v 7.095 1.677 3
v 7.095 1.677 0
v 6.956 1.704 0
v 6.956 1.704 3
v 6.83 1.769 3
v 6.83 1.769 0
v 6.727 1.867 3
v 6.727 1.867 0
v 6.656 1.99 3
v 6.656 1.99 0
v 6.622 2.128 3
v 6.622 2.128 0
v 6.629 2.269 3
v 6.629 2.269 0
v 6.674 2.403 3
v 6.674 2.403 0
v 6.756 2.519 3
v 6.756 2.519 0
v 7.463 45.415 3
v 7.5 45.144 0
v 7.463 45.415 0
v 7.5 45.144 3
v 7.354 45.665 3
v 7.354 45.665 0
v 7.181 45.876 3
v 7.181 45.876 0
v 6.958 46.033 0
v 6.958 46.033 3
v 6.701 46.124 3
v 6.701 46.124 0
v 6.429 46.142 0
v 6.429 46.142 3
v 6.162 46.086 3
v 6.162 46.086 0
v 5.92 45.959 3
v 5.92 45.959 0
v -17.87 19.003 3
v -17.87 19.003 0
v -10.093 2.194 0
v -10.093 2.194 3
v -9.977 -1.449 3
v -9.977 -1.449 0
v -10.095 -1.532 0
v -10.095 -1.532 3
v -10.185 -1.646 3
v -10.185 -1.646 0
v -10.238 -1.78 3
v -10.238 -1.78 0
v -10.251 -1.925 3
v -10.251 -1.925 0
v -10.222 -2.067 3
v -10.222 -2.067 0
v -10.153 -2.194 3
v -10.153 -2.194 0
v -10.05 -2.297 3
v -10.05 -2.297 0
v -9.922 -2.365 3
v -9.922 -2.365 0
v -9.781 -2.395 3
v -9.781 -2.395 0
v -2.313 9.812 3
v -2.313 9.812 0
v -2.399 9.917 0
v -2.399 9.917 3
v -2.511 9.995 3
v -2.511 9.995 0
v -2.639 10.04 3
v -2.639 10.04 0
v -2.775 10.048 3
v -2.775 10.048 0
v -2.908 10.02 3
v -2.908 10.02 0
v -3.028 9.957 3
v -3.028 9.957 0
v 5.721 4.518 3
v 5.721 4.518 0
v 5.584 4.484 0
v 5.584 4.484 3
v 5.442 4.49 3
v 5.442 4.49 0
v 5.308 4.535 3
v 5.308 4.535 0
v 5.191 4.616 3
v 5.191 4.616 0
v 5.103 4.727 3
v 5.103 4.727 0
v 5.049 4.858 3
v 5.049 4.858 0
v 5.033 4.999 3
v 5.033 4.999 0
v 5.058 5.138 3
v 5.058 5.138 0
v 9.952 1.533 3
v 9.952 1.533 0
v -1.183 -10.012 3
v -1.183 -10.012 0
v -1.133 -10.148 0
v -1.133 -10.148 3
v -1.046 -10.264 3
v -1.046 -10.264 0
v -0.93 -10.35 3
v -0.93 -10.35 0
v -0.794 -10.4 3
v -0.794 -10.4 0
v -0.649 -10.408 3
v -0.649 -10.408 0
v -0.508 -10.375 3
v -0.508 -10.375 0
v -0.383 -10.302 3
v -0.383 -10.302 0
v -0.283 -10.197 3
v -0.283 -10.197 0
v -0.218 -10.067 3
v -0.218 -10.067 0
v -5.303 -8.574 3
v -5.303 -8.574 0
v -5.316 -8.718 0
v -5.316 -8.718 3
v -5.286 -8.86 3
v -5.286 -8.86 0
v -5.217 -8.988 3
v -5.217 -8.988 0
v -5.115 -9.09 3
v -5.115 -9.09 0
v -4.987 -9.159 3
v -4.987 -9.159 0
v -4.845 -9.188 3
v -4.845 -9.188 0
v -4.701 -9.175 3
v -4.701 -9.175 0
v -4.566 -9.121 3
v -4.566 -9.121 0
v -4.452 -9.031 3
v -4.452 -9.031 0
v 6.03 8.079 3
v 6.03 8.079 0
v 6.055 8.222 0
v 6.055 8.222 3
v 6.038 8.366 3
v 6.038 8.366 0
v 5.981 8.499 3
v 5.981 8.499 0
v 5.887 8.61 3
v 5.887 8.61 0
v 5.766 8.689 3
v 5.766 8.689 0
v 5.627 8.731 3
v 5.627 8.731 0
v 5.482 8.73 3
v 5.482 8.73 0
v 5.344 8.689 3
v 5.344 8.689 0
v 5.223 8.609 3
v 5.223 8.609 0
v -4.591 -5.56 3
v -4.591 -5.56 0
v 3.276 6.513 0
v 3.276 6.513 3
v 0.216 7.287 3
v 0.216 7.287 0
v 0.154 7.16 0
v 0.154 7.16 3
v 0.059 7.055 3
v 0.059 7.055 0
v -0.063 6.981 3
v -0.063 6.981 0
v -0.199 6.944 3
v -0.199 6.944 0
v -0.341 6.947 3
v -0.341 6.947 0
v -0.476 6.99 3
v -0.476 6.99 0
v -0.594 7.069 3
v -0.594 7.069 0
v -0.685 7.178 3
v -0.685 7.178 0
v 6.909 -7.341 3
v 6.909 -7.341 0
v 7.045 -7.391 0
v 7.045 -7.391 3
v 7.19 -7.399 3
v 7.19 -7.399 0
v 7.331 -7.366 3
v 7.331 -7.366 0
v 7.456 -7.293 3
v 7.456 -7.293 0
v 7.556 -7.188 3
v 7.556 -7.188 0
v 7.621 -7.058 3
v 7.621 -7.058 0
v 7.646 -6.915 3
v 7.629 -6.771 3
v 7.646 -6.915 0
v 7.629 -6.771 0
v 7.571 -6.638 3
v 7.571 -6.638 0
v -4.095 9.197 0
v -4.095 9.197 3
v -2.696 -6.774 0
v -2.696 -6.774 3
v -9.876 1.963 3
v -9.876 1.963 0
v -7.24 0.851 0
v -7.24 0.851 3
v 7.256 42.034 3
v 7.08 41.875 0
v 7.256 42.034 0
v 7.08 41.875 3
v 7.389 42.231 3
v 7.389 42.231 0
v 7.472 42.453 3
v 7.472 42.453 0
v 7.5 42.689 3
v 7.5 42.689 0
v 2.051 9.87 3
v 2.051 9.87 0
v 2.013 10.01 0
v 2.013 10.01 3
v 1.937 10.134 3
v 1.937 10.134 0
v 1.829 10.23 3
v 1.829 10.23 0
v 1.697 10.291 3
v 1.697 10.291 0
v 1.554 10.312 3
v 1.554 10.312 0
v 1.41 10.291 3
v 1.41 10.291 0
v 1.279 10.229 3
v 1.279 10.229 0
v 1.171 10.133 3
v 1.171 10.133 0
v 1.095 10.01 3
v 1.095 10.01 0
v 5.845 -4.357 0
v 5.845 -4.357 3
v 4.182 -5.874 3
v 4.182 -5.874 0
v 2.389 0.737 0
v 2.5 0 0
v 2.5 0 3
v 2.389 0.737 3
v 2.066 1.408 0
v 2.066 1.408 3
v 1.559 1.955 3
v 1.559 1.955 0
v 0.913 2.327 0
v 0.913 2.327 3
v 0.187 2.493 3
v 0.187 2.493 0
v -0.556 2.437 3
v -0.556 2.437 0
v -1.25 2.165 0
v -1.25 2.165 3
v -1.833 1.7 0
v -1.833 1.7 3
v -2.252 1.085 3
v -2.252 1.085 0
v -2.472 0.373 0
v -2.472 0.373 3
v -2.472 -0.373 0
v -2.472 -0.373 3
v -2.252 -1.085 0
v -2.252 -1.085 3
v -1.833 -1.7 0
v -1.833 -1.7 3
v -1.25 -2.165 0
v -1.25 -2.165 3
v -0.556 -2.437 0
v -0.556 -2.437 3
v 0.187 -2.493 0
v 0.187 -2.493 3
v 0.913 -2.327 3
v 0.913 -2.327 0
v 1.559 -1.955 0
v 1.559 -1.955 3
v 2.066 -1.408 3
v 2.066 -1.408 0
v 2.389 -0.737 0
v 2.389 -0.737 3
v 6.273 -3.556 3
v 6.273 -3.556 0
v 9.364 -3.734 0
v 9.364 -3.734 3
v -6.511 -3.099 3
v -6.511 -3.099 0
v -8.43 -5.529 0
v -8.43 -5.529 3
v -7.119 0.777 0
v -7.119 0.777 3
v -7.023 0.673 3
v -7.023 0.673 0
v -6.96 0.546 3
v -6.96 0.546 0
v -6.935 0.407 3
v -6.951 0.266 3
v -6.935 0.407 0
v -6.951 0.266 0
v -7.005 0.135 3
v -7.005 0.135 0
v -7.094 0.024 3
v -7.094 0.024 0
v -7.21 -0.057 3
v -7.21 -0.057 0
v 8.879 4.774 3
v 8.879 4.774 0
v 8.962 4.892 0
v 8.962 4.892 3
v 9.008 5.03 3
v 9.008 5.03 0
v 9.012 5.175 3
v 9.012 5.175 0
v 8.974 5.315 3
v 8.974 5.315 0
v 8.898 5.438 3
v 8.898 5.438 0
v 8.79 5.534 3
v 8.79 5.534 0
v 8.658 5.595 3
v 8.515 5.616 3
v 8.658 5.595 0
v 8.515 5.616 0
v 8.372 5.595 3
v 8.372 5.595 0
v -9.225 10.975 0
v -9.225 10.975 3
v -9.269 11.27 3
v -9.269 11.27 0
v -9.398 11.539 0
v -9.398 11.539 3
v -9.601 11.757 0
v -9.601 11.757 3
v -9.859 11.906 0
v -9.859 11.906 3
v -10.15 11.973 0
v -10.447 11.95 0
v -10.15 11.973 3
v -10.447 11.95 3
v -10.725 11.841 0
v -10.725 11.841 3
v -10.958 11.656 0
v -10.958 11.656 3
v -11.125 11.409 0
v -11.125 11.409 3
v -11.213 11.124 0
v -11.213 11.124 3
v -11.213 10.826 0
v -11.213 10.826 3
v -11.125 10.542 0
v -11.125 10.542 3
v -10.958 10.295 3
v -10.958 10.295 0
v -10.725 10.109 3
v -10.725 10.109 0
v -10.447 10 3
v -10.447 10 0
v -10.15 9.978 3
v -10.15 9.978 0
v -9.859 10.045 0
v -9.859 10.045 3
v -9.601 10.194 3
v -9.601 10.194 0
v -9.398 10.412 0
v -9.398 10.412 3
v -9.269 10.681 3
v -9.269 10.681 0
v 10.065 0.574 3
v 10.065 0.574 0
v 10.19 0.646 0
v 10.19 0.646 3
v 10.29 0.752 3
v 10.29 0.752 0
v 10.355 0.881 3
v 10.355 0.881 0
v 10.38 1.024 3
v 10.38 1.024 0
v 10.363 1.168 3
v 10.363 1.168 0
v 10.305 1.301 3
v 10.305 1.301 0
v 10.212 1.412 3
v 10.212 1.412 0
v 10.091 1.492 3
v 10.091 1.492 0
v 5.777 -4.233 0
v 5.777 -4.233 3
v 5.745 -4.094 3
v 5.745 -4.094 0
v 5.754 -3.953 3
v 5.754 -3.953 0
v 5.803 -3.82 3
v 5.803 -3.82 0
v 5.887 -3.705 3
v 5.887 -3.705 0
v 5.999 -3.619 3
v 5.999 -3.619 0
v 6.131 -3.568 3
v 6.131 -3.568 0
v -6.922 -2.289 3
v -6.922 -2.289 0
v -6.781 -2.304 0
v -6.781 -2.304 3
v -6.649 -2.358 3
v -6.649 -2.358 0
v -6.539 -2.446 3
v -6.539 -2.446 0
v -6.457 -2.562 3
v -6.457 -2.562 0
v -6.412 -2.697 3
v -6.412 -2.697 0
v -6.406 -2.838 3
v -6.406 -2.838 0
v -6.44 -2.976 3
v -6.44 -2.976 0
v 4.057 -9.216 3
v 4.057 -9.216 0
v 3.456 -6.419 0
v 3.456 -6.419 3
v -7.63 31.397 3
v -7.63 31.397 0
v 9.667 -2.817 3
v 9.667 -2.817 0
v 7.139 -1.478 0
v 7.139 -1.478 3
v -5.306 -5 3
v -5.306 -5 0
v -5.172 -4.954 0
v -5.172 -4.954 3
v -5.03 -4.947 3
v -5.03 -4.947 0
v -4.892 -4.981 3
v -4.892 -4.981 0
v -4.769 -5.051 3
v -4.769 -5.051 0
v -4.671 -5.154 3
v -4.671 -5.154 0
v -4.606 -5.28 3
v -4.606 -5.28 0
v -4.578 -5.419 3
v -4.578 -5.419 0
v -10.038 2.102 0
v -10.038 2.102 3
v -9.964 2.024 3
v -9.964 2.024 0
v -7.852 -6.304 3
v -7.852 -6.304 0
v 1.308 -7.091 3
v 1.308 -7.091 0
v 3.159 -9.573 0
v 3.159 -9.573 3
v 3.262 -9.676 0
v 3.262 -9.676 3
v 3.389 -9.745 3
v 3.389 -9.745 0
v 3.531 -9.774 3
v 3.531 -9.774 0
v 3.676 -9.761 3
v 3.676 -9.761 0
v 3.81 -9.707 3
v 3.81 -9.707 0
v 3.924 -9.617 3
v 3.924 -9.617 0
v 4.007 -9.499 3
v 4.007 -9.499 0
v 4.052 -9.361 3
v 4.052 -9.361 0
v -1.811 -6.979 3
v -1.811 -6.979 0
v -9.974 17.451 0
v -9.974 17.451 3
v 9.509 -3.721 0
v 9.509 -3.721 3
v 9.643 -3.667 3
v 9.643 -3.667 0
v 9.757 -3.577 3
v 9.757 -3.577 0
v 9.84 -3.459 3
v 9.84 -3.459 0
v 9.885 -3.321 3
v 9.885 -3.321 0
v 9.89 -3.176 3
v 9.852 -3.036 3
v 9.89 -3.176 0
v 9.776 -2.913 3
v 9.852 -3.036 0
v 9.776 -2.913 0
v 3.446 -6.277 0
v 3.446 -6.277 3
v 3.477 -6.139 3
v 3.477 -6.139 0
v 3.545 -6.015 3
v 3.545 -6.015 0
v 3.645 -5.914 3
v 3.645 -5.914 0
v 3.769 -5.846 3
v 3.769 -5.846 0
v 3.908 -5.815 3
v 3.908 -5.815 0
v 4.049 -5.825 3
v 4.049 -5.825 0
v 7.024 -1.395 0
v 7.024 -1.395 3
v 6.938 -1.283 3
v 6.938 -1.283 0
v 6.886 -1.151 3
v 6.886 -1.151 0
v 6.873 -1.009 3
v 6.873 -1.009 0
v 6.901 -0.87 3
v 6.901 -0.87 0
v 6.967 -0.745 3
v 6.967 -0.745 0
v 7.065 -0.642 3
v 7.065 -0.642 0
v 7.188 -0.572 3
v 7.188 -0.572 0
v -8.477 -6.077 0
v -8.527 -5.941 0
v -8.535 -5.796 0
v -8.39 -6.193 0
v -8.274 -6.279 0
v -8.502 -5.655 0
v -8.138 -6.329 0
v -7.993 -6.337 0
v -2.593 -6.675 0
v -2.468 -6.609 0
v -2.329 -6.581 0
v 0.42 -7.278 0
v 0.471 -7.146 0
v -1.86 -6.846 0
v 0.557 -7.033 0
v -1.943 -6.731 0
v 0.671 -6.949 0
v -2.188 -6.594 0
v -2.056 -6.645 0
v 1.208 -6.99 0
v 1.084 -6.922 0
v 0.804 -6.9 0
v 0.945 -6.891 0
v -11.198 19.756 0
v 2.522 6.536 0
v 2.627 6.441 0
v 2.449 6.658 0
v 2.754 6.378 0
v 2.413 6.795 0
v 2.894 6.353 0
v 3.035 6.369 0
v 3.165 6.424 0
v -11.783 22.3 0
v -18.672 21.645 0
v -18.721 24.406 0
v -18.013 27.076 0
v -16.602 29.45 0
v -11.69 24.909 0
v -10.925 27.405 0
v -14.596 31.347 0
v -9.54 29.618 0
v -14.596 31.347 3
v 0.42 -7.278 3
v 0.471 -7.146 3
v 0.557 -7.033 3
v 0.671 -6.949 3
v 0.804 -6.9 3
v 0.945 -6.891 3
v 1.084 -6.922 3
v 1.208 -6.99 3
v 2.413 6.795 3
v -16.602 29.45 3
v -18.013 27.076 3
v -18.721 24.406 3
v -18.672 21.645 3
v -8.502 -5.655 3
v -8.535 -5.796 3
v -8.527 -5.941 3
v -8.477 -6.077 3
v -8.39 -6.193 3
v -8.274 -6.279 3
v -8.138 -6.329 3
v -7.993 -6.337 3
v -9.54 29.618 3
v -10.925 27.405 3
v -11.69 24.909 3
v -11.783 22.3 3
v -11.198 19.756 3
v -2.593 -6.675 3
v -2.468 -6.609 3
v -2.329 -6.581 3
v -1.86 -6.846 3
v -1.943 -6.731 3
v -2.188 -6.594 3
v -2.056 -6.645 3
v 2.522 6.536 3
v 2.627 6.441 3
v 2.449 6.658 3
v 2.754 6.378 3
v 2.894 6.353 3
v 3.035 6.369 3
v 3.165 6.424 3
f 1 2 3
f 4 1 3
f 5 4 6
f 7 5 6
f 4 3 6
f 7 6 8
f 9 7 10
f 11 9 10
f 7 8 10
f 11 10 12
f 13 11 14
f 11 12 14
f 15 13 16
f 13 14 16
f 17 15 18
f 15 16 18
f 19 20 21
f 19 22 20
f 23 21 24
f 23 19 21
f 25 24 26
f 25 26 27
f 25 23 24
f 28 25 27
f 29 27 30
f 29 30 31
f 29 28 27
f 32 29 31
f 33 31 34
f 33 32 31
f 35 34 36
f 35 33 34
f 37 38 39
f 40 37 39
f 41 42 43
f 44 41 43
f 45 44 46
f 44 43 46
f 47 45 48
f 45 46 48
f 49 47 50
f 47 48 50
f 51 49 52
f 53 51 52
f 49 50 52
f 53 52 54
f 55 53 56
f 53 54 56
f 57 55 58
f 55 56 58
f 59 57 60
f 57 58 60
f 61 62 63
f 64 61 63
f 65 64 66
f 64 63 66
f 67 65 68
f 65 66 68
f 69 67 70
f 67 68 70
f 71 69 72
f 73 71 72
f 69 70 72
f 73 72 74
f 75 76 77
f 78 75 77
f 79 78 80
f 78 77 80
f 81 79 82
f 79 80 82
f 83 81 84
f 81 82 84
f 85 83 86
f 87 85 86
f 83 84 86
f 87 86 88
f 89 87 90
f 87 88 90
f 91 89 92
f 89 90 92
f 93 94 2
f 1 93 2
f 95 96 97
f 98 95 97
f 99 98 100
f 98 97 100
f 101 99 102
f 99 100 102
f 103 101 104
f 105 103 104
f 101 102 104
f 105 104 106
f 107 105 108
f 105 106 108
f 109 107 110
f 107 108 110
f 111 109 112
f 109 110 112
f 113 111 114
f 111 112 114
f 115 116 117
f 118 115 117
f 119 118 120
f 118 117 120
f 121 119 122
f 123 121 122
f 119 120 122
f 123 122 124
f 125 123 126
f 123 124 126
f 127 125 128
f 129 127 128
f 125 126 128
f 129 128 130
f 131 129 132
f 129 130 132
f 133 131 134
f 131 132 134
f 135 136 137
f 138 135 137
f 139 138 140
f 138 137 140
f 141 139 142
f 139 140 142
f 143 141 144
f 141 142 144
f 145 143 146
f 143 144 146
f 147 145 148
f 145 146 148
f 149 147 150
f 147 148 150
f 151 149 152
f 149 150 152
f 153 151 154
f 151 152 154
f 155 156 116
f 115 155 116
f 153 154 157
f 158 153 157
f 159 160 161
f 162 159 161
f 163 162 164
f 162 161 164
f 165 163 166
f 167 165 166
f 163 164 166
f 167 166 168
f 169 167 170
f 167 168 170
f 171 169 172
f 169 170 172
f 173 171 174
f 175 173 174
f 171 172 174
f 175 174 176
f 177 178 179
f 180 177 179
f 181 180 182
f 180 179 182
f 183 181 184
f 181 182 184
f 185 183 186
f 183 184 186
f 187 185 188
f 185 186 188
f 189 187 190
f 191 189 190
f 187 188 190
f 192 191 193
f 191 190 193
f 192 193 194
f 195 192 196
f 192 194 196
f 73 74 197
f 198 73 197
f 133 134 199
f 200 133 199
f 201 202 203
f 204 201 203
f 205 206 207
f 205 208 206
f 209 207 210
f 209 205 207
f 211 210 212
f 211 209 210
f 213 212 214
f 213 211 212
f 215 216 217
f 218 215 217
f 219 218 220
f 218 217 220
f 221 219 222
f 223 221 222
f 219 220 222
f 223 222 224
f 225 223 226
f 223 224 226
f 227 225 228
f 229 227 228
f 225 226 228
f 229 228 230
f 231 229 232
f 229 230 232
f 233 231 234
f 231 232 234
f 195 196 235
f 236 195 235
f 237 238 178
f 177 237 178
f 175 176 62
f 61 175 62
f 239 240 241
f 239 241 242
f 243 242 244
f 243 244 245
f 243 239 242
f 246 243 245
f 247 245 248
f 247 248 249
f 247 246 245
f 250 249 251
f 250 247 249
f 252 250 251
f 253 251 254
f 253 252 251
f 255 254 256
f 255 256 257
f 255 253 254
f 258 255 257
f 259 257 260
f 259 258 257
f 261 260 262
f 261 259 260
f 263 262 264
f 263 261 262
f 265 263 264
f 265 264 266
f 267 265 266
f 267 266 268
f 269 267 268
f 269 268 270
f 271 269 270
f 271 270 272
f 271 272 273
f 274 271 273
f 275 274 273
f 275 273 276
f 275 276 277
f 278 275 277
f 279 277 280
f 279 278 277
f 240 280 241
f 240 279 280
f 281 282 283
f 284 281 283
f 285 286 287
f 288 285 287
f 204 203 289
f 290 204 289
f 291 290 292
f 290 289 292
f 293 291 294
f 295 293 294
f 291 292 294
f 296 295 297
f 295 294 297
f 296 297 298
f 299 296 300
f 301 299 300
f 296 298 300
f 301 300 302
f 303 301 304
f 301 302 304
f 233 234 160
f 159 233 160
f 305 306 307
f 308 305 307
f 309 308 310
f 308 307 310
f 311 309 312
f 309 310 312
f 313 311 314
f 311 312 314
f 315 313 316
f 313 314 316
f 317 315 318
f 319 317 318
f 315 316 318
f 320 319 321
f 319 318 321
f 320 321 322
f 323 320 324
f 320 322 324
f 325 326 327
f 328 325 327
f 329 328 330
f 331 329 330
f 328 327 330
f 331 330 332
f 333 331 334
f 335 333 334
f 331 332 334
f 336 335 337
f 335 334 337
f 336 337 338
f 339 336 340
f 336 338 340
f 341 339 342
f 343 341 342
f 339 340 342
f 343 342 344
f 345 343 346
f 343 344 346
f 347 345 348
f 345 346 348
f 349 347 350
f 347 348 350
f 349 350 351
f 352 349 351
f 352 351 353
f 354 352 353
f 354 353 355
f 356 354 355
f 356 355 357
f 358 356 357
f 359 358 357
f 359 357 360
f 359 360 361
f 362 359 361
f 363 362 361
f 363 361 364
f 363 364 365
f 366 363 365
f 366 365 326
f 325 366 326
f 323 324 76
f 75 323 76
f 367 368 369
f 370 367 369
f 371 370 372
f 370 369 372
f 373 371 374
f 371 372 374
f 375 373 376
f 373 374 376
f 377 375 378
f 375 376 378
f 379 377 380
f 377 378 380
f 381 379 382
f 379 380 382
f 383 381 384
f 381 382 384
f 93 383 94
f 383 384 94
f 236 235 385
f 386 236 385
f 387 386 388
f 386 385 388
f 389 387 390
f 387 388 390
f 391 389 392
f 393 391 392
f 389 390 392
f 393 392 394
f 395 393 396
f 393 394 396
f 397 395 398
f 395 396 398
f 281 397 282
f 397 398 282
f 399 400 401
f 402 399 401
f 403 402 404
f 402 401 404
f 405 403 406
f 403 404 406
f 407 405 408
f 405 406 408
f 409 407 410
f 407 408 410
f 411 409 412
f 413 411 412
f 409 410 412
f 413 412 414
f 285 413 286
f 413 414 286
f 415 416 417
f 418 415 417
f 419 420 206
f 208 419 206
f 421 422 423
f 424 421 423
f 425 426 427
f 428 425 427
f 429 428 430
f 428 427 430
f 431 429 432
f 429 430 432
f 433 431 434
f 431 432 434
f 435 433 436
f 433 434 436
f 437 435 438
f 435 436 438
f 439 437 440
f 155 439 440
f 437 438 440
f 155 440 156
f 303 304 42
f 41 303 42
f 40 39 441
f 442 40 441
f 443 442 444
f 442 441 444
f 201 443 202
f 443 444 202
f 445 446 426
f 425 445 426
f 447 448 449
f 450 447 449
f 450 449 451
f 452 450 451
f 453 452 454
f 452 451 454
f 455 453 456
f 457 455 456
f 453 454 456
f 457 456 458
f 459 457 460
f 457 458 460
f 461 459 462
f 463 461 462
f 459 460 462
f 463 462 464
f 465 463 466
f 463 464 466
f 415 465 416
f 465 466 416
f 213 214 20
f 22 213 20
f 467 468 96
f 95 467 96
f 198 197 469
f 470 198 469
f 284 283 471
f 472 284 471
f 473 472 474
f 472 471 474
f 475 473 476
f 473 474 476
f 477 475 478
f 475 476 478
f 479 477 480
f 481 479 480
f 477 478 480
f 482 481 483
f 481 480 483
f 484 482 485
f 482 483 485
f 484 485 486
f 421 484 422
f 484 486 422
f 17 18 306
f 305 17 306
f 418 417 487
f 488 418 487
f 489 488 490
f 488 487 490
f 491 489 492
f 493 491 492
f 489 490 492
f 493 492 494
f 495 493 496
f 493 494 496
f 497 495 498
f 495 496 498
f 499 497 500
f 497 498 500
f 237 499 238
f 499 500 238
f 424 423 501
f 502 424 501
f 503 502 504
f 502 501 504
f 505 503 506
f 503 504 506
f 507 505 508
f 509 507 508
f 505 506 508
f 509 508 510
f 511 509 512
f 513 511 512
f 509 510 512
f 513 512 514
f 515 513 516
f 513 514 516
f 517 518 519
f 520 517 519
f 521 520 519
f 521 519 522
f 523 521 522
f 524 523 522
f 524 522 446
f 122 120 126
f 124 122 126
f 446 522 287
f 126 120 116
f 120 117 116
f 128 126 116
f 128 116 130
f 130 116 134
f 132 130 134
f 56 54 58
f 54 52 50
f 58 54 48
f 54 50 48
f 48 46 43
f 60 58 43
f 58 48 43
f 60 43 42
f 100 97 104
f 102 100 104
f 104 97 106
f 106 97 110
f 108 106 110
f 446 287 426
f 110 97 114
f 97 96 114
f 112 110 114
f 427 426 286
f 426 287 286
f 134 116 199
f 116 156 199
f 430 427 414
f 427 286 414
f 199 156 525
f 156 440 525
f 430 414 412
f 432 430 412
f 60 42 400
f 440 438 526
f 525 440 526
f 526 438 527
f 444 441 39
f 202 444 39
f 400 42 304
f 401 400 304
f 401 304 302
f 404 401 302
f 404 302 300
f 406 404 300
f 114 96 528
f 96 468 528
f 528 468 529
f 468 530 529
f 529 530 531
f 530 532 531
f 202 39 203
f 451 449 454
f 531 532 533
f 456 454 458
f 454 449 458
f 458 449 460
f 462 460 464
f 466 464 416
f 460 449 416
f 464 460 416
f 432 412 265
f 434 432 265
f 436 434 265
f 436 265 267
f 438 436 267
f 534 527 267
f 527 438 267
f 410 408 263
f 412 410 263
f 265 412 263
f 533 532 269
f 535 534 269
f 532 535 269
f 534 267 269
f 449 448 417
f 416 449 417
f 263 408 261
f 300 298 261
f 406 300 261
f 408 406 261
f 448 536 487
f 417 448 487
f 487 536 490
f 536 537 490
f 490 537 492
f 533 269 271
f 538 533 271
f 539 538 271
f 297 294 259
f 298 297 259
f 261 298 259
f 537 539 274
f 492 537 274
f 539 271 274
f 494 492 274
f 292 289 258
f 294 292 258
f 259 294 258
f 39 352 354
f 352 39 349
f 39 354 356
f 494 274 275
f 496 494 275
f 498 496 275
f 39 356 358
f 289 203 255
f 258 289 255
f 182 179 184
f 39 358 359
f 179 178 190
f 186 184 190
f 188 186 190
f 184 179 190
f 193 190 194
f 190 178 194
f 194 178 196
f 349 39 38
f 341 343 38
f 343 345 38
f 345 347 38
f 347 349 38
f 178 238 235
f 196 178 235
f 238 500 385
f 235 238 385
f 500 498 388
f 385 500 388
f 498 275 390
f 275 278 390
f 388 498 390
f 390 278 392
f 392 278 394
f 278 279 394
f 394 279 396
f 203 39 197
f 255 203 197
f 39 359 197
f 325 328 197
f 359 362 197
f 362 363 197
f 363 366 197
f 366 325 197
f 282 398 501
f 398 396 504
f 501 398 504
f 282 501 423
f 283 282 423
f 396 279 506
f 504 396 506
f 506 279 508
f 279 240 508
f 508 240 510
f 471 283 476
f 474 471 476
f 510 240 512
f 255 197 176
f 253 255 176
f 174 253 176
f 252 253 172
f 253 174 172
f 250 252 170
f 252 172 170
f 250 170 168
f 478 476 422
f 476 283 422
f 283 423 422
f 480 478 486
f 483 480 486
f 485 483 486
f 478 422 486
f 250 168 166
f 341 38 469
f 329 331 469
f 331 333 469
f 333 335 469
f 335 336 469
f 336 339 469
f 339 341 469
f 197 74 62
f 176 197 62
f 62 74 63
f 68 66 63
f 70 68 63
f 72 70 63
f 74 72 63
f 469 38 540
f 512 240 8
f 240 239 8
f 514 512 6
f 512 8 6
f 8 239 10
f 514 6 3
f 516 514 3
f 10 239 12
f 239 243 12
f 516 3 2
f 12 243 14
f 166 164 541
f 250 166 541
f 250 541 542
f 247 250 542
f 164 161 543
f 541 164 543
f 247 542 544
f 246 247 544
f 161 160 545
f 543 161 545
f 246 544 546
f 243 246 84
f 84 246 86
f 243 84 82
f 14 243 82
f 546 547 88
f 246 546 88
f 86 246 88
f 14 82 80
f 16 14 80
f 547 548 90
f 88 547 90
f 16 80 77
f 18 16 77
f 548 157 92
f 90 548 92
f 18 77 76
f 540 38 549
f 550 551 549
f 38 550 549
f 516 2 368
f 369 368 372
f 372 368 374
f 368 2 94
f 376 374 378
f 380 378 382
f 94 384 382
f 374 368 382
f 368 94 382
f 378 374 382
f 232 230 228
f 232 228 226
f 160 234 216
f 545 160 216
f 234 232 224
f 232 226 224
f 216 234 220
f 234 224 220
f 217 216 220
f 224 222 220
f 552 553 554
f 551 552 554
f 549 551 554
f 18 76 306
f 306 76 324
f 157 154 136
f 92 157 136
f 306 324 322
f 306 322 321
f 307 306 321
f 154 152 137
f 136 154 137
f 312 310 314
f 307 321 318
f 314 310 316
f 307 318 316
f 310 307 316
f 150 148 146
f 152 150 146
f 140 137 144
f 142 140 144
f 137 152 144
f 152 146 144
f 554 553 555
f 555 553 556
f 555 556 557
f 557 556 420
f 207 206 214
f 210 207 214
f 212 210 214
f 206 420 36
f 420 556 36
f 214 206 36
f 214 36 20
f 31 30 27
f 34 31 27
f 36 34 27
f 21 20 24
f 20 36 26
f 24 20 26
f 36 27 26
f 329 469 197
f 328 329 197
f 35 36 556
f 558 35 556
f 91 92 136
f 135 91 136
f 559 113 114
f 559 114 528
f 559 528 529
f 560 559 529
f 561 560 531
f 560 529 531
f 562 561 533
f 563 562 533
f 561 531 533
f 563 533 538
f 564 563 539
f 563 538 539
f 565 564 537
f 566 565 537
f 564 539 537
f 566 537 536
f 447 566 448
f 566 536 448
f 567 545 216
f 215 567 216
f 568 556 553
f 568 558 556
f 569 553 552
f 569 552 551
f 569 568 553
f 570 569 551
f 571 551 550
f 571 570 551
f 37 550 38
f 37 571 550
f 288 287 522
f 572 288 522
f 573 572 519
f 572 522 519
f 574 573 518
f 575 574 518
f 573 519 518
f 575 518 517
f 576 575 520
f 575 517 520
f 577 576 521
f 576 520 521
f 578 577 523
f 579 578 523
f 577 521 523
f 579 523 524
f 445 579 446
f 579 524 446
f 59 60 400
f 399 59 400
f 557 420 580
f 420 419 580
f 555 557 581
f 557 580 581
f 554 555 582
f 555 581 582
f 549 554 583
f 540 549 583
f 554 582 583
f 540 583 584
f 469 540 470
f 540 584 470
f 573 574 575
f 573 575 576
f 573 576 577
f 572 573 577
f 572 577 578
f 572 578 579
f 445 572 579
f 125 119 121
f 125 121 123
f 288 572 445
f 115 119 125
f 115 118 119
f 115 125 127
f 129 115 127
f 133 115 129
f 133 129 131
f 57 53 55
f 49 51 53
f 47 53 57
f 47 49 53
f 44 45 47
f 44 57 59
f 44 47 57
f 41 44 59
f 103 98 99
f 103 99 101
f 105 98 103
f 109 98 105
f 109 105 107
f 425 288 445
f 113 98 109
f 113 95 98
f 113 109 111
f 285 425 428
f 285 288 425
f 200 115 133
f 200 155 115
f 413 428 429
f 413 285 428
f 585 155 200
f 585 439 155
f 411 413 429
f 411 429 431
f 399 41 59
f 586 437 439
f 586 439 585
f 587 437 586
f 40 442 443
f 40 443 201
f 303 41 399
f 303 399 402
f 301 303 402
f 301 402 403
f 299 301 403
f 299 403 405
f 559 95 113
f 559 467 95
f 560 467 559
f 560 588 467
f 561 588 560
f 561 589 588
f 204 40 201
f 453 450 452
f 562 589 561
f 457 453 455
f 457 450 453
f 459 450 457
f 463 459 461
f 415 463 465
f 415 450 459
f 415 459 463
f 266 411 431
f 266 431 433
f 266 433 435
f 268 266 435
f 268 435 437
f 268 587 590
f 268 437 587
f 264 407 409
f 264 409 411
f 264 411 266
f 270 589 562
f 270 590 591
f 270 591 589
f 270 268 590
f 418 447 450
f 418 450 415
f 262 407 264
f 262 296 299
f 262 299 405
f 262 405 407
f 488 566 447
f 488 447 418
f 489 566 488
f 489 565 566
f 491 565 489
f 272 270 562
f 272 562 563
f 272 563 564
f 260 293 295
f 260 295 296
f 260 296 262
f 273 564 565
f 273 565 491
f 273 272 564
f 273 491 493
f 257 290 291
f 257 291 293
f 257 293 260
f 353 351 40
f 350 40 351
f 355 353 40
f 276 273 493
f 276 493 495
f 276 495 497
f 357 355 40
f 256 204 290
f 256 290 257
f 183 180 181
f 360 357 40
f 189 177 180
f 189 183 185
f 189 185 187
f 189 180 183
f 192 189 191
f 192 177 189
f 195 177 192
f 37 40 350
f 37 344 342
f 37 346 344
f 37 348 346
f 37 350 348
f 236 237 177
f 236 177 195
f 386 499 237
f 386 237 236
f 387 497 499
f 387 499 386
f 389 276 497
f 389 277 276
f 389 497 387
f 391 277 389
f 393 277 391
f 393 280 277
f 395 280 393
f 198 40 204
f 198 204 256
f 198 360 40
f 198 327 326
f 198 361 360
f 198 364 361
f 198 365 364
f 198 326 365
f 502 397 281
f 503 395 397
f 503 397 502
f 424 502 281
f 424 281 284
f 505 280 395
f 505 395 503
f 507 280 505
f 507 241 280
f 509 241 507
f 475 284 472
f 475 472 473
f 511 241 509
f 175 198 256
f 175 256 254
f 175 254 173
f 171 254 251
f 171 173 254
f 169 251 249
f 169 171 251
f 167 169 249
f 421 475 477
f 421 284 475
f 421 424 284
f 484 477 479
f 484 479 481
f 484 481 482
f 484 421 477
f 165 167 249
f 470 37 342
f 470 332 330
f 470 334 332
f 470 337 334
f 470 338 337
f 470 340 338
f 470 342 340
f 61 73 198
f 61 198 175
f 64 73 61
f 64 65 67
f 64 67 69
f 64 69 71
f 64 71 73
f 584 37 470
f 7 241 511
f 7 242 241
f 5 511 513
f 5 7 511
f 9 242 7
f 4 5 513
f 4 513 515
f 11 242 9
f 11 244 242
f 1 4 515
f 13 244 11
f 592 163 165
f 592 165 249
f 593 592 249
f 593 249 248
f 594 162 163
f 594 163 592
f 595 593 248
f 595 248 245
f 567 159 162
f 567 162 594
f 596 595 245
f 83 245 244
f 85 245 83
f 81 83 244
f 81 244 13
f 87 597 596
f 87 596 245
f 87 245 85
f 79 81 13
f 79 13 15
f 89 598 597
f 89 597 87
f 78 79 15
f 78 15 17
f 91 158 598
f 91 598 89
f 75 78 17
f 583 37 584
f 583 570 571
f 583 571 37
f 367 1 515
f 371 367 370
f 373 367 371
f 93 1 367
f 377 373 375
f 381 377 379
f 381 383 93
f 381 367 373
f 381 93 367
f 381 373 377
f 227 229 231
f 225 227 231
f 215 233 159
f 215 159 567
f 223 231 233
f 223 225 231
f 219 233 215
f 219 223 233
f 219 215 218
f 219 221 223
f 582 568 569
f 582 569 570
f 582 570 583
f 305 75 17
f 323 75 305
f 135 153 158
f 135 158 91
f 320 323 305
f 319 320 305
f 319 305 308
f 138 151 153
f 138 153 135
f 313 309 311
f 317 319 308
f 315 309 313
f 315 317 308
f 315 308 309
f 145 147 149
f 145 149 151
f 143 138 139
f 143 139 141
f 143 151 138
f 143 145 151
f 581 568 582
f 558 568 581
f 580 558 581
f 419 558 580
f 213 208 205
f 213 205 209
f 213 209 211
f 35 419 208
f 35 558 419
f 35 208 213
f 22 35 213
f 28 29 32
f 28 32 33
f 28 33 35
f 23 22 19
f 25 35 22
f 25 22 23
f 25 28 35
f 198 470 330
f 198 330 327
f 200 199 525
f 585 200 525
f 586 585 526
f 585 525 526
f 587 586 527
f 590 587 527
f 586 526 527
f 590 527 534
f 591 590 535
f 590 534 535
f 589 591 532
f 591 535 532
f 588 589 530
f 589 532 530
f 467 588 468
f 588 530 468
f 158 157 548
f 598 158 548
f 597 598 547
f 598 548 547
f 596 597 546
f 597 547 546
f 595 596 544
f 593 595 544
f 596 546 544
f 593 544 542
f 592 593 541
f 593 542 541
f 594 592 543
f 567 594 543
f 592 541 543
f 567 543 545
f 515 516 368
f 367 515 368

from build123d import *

# Parameters (mm, degrees)
SKETCH1_R           = 2.5
BOSS_EXTRUDE1_DEPTH = 3
FILLET1_R           = 10
FILLET2_R           = 1
SKETCH2_R           = 1
CUT_EXTRUDE1_DEPTH  = 5


with BuildPart() as part:
    # Sketch1 → Boss-Extrude1 (new body)
    with BuildSketch(Plane.XY):
        with BuildLine():
            Line((-15.775199063, 25.595763214), (7.5, 42.17358061))
            Line((7.5, 42.17358061), (7.5, 47.084472248))
            Line((7.5, 47.084472248), (-21.353827366, 26.533263214))
            Line((-21.353827366, 26.533263214), (-10.092955814, 2.19356054))
            ThreePointArc((-10.092955814, 2.19356054), (-10.003238503, 2.060792281), (-9.876128914, 1.963223028))
            Line((-9.876128914, 1.963223028), (-7.240482475, 0.850547008))
            ThreePointArc((-7.240482475, 0.850547008), (-6.935224137, 0.406591519), (-7.210200963, -0.056730047))
            Line((-7.210200963, -0.056730047), (-9.9765648, -1.448728989))
            ThreePointArc((-9.9765648, -1.448728989), (-10.241411893, -1.996858986), (-9.780506444, -2.394548117))
            Line((-9.780506444, -2.394548117), (-6.921562347, -2.289102741))
            ThreePointArc((-6.921562347, -2.289102741), (-6.457280642, -2.56245531), (-6.510686125, -3.098577481))
            Line((-6.510686125, -3.098577481), (-8.429579039, -5.529272837))
            ThreePointArc((-8.429579039, -5.529272837), (-8.437962276, -6.137976541), (-7.852169389, -6.303618237))
            Line((-7.852169389, -6.303618237), (-5.305649232, -4.999810287))
            ThreePointArc((-5.305649232, -4.999810287), (-4.76934332, -5.051337921), (-4.591170105, -5.559799752))
            Line((-4.591170105, -5.559799752), (-5.303021449, -8.57371707))
            ThreePointArc((-5.303021449, -8.57371707), (-5.053369941, -9.128932885), (-4.45245808, -9.031488473))
            Line((-4.45245808, -9.031488473), (-2.695540082, -6.773631253))
            ThreePointArc((-2.695540082, -6.773631253), (-2.187705338, -6.593678477), (-1.811340311, -6.979202139))
            Line((-1.811340311, -6.979202139), (-1.182760229, -10.011580251))
            ThreePointArc((-1.182760229, -10.011580251), (-0.721854781, -10.409269381), (-0.21842547, -10.066998426))
            Line((-0.21842547, -10.066998426), (0.419671299, -7.278179214))
            ThreePointArc((0.419671299, -7.278179214), (0.803874553, -6.900466376), (1.307906448, -7.09081074))
            Line((1.307906448, -7.09081074), (3.159131837, -9.573429214))
            ThreePointArc((3.159131837, -9.573429214), (3.744924723, -9.73907091), (4.056536671, -9.216109658))
            Line((4.056536671, -9.216109658), (3.456242815, -6.418909742))
            ThreePointArc((3.456242815, -6.418909742), (3.644820872, -5.914214344), (4.182071907, -5.87371184))
            Line((4.182071907, -5.87371184), (6.909051797, -7.34136664))
            ThreePointArc((6.909051797, -7.34136664), (7.509963658, -7.243922228), (7.571367017, -6.638265473))
            Line((7.571367017, -6.638265473), (5.845168255, -4.356836553))
            ThreePointArc((5.845168255, -4.356836553), (5.802784524, -3.819730653), (6.272582224, -3.55597082))
            Line((6.272582224, -3.55597082), (9.364323053, -3.733646292))
            ThreePointArc((9.364323053, -3.733646292), (9.867752363, -3.391375337), (9.667441101, -2.816513723))
            Line((9.667441101, -2.816513723), (7.138800197, -1.478360048))
            ThreePointArc((7.138800197, -1.478360048), (6.87339673, -1.009488927), (7.187708321, -0.571896249))
            Line((7.187708321, -0.571896249), (10.064866009, 0.573701222))
            ThreePointArc((10.064866009, 0.573701222), (10.376477957, 1.096662475), (9.951987284, 1.533008835))
            Line((9.951987284, 1.533008835), (7.094732162, 1.677138107))
            ThreePointArc((7.094732162, 1.677138107), (6.656041435, 1.989915303), (6.75596982, 2.519342773))
            Line((6.75596982, 2.519342773), (8.879409827, 4.773546063))
            ThreePointArc((8.879409827, 4.773546063), (8.940813186, 5.379202818), (8.371686043, 5.595269411))
            Line((8.371686043, 5.595269411), (5.721221814, 4.5183667))
            ThreePointArc((5.721221814, 4.5183667), (5.191447637, 4.616440396), (5.058267794, 5.138496195))
            Line((5.058267794, 5.138496195), (6.030090531, 8.078902715))
            ThreePointArc((6.030090531, 8.078902715), (5.829779269, 8.653764329), (5.222661219, 8.609063642))
            Line((5.222661219, 8.609063642), (3.275643601, 6.512923743))
            ThreePointArc((3.275643601, 6.512923743), (2.754057404, 6.377916456), (2.41272516, 6.794775458))
            Line((2.41272516, 6.794775458), (2.050826183, 9.870398819))
            ThreePointArc((2.050826183, 9.870398819), (1.62633551, 10.306745179), (1.09499102, 10.009653423))
            Line((1.09499102, 10.009653423), (0.216260792, 7.287060309))
            ThreePointArc((0.216260792, 7.287060309), (-0.199400295, 6.944270302), (-0.684924592, 7.177819622))
            Line((-0.684924592, 7.177819622), (-2.312731053, 9.812335907))
            ThreePointArc((-2.312731053, 9.812335907), (-2.639135445, 10.039629661), (-3.028156876, 9.956776757))
            Line((-3.028156876, 9.956776757), (-4.095052713, 9.19687759))
            Line((-4.095052713, 9.19687759), (-15.775199063, 25.595763214))
        make_face()
        Circle(SKETCH1_R, mode=Mode.SUBTRACT)
    extrude(amount=BOSS_EXTRUDE1_DEPTH)

    # Fillet1
    fillet1_edges = [part.edges().sort_by_distance(p)[0] for p in [
        (-21.353827366, 26.533263214, 1.5),
        (-15.775199063, 25.595763214, 1.5),
    ]]
    fillet(fillet1_edges, radius=FILLET1_R)

    # Fillet2
    fillet2_edges = [part.edges().sort_by_distance(p)[0] for p in [
        (7.5, 47.084472248, 1.5),
        (7.5, 42.17358061, 1.5),
    ]]
    fillet(fillet2_edges, radius=FILLET2_R)

    # Sketch2 → Cut-Extrude1 (cut)
    with BuildSketch(Plane.XY.offset(3)):
        with Locations((-10.224511364, 10.975398278)):
            Circle(SKETCH2_R)
    extrude(amount=-CUT_EXTRUDE1_DEPTH, mode=Mode.SUBTRACT)


solid = part.part
